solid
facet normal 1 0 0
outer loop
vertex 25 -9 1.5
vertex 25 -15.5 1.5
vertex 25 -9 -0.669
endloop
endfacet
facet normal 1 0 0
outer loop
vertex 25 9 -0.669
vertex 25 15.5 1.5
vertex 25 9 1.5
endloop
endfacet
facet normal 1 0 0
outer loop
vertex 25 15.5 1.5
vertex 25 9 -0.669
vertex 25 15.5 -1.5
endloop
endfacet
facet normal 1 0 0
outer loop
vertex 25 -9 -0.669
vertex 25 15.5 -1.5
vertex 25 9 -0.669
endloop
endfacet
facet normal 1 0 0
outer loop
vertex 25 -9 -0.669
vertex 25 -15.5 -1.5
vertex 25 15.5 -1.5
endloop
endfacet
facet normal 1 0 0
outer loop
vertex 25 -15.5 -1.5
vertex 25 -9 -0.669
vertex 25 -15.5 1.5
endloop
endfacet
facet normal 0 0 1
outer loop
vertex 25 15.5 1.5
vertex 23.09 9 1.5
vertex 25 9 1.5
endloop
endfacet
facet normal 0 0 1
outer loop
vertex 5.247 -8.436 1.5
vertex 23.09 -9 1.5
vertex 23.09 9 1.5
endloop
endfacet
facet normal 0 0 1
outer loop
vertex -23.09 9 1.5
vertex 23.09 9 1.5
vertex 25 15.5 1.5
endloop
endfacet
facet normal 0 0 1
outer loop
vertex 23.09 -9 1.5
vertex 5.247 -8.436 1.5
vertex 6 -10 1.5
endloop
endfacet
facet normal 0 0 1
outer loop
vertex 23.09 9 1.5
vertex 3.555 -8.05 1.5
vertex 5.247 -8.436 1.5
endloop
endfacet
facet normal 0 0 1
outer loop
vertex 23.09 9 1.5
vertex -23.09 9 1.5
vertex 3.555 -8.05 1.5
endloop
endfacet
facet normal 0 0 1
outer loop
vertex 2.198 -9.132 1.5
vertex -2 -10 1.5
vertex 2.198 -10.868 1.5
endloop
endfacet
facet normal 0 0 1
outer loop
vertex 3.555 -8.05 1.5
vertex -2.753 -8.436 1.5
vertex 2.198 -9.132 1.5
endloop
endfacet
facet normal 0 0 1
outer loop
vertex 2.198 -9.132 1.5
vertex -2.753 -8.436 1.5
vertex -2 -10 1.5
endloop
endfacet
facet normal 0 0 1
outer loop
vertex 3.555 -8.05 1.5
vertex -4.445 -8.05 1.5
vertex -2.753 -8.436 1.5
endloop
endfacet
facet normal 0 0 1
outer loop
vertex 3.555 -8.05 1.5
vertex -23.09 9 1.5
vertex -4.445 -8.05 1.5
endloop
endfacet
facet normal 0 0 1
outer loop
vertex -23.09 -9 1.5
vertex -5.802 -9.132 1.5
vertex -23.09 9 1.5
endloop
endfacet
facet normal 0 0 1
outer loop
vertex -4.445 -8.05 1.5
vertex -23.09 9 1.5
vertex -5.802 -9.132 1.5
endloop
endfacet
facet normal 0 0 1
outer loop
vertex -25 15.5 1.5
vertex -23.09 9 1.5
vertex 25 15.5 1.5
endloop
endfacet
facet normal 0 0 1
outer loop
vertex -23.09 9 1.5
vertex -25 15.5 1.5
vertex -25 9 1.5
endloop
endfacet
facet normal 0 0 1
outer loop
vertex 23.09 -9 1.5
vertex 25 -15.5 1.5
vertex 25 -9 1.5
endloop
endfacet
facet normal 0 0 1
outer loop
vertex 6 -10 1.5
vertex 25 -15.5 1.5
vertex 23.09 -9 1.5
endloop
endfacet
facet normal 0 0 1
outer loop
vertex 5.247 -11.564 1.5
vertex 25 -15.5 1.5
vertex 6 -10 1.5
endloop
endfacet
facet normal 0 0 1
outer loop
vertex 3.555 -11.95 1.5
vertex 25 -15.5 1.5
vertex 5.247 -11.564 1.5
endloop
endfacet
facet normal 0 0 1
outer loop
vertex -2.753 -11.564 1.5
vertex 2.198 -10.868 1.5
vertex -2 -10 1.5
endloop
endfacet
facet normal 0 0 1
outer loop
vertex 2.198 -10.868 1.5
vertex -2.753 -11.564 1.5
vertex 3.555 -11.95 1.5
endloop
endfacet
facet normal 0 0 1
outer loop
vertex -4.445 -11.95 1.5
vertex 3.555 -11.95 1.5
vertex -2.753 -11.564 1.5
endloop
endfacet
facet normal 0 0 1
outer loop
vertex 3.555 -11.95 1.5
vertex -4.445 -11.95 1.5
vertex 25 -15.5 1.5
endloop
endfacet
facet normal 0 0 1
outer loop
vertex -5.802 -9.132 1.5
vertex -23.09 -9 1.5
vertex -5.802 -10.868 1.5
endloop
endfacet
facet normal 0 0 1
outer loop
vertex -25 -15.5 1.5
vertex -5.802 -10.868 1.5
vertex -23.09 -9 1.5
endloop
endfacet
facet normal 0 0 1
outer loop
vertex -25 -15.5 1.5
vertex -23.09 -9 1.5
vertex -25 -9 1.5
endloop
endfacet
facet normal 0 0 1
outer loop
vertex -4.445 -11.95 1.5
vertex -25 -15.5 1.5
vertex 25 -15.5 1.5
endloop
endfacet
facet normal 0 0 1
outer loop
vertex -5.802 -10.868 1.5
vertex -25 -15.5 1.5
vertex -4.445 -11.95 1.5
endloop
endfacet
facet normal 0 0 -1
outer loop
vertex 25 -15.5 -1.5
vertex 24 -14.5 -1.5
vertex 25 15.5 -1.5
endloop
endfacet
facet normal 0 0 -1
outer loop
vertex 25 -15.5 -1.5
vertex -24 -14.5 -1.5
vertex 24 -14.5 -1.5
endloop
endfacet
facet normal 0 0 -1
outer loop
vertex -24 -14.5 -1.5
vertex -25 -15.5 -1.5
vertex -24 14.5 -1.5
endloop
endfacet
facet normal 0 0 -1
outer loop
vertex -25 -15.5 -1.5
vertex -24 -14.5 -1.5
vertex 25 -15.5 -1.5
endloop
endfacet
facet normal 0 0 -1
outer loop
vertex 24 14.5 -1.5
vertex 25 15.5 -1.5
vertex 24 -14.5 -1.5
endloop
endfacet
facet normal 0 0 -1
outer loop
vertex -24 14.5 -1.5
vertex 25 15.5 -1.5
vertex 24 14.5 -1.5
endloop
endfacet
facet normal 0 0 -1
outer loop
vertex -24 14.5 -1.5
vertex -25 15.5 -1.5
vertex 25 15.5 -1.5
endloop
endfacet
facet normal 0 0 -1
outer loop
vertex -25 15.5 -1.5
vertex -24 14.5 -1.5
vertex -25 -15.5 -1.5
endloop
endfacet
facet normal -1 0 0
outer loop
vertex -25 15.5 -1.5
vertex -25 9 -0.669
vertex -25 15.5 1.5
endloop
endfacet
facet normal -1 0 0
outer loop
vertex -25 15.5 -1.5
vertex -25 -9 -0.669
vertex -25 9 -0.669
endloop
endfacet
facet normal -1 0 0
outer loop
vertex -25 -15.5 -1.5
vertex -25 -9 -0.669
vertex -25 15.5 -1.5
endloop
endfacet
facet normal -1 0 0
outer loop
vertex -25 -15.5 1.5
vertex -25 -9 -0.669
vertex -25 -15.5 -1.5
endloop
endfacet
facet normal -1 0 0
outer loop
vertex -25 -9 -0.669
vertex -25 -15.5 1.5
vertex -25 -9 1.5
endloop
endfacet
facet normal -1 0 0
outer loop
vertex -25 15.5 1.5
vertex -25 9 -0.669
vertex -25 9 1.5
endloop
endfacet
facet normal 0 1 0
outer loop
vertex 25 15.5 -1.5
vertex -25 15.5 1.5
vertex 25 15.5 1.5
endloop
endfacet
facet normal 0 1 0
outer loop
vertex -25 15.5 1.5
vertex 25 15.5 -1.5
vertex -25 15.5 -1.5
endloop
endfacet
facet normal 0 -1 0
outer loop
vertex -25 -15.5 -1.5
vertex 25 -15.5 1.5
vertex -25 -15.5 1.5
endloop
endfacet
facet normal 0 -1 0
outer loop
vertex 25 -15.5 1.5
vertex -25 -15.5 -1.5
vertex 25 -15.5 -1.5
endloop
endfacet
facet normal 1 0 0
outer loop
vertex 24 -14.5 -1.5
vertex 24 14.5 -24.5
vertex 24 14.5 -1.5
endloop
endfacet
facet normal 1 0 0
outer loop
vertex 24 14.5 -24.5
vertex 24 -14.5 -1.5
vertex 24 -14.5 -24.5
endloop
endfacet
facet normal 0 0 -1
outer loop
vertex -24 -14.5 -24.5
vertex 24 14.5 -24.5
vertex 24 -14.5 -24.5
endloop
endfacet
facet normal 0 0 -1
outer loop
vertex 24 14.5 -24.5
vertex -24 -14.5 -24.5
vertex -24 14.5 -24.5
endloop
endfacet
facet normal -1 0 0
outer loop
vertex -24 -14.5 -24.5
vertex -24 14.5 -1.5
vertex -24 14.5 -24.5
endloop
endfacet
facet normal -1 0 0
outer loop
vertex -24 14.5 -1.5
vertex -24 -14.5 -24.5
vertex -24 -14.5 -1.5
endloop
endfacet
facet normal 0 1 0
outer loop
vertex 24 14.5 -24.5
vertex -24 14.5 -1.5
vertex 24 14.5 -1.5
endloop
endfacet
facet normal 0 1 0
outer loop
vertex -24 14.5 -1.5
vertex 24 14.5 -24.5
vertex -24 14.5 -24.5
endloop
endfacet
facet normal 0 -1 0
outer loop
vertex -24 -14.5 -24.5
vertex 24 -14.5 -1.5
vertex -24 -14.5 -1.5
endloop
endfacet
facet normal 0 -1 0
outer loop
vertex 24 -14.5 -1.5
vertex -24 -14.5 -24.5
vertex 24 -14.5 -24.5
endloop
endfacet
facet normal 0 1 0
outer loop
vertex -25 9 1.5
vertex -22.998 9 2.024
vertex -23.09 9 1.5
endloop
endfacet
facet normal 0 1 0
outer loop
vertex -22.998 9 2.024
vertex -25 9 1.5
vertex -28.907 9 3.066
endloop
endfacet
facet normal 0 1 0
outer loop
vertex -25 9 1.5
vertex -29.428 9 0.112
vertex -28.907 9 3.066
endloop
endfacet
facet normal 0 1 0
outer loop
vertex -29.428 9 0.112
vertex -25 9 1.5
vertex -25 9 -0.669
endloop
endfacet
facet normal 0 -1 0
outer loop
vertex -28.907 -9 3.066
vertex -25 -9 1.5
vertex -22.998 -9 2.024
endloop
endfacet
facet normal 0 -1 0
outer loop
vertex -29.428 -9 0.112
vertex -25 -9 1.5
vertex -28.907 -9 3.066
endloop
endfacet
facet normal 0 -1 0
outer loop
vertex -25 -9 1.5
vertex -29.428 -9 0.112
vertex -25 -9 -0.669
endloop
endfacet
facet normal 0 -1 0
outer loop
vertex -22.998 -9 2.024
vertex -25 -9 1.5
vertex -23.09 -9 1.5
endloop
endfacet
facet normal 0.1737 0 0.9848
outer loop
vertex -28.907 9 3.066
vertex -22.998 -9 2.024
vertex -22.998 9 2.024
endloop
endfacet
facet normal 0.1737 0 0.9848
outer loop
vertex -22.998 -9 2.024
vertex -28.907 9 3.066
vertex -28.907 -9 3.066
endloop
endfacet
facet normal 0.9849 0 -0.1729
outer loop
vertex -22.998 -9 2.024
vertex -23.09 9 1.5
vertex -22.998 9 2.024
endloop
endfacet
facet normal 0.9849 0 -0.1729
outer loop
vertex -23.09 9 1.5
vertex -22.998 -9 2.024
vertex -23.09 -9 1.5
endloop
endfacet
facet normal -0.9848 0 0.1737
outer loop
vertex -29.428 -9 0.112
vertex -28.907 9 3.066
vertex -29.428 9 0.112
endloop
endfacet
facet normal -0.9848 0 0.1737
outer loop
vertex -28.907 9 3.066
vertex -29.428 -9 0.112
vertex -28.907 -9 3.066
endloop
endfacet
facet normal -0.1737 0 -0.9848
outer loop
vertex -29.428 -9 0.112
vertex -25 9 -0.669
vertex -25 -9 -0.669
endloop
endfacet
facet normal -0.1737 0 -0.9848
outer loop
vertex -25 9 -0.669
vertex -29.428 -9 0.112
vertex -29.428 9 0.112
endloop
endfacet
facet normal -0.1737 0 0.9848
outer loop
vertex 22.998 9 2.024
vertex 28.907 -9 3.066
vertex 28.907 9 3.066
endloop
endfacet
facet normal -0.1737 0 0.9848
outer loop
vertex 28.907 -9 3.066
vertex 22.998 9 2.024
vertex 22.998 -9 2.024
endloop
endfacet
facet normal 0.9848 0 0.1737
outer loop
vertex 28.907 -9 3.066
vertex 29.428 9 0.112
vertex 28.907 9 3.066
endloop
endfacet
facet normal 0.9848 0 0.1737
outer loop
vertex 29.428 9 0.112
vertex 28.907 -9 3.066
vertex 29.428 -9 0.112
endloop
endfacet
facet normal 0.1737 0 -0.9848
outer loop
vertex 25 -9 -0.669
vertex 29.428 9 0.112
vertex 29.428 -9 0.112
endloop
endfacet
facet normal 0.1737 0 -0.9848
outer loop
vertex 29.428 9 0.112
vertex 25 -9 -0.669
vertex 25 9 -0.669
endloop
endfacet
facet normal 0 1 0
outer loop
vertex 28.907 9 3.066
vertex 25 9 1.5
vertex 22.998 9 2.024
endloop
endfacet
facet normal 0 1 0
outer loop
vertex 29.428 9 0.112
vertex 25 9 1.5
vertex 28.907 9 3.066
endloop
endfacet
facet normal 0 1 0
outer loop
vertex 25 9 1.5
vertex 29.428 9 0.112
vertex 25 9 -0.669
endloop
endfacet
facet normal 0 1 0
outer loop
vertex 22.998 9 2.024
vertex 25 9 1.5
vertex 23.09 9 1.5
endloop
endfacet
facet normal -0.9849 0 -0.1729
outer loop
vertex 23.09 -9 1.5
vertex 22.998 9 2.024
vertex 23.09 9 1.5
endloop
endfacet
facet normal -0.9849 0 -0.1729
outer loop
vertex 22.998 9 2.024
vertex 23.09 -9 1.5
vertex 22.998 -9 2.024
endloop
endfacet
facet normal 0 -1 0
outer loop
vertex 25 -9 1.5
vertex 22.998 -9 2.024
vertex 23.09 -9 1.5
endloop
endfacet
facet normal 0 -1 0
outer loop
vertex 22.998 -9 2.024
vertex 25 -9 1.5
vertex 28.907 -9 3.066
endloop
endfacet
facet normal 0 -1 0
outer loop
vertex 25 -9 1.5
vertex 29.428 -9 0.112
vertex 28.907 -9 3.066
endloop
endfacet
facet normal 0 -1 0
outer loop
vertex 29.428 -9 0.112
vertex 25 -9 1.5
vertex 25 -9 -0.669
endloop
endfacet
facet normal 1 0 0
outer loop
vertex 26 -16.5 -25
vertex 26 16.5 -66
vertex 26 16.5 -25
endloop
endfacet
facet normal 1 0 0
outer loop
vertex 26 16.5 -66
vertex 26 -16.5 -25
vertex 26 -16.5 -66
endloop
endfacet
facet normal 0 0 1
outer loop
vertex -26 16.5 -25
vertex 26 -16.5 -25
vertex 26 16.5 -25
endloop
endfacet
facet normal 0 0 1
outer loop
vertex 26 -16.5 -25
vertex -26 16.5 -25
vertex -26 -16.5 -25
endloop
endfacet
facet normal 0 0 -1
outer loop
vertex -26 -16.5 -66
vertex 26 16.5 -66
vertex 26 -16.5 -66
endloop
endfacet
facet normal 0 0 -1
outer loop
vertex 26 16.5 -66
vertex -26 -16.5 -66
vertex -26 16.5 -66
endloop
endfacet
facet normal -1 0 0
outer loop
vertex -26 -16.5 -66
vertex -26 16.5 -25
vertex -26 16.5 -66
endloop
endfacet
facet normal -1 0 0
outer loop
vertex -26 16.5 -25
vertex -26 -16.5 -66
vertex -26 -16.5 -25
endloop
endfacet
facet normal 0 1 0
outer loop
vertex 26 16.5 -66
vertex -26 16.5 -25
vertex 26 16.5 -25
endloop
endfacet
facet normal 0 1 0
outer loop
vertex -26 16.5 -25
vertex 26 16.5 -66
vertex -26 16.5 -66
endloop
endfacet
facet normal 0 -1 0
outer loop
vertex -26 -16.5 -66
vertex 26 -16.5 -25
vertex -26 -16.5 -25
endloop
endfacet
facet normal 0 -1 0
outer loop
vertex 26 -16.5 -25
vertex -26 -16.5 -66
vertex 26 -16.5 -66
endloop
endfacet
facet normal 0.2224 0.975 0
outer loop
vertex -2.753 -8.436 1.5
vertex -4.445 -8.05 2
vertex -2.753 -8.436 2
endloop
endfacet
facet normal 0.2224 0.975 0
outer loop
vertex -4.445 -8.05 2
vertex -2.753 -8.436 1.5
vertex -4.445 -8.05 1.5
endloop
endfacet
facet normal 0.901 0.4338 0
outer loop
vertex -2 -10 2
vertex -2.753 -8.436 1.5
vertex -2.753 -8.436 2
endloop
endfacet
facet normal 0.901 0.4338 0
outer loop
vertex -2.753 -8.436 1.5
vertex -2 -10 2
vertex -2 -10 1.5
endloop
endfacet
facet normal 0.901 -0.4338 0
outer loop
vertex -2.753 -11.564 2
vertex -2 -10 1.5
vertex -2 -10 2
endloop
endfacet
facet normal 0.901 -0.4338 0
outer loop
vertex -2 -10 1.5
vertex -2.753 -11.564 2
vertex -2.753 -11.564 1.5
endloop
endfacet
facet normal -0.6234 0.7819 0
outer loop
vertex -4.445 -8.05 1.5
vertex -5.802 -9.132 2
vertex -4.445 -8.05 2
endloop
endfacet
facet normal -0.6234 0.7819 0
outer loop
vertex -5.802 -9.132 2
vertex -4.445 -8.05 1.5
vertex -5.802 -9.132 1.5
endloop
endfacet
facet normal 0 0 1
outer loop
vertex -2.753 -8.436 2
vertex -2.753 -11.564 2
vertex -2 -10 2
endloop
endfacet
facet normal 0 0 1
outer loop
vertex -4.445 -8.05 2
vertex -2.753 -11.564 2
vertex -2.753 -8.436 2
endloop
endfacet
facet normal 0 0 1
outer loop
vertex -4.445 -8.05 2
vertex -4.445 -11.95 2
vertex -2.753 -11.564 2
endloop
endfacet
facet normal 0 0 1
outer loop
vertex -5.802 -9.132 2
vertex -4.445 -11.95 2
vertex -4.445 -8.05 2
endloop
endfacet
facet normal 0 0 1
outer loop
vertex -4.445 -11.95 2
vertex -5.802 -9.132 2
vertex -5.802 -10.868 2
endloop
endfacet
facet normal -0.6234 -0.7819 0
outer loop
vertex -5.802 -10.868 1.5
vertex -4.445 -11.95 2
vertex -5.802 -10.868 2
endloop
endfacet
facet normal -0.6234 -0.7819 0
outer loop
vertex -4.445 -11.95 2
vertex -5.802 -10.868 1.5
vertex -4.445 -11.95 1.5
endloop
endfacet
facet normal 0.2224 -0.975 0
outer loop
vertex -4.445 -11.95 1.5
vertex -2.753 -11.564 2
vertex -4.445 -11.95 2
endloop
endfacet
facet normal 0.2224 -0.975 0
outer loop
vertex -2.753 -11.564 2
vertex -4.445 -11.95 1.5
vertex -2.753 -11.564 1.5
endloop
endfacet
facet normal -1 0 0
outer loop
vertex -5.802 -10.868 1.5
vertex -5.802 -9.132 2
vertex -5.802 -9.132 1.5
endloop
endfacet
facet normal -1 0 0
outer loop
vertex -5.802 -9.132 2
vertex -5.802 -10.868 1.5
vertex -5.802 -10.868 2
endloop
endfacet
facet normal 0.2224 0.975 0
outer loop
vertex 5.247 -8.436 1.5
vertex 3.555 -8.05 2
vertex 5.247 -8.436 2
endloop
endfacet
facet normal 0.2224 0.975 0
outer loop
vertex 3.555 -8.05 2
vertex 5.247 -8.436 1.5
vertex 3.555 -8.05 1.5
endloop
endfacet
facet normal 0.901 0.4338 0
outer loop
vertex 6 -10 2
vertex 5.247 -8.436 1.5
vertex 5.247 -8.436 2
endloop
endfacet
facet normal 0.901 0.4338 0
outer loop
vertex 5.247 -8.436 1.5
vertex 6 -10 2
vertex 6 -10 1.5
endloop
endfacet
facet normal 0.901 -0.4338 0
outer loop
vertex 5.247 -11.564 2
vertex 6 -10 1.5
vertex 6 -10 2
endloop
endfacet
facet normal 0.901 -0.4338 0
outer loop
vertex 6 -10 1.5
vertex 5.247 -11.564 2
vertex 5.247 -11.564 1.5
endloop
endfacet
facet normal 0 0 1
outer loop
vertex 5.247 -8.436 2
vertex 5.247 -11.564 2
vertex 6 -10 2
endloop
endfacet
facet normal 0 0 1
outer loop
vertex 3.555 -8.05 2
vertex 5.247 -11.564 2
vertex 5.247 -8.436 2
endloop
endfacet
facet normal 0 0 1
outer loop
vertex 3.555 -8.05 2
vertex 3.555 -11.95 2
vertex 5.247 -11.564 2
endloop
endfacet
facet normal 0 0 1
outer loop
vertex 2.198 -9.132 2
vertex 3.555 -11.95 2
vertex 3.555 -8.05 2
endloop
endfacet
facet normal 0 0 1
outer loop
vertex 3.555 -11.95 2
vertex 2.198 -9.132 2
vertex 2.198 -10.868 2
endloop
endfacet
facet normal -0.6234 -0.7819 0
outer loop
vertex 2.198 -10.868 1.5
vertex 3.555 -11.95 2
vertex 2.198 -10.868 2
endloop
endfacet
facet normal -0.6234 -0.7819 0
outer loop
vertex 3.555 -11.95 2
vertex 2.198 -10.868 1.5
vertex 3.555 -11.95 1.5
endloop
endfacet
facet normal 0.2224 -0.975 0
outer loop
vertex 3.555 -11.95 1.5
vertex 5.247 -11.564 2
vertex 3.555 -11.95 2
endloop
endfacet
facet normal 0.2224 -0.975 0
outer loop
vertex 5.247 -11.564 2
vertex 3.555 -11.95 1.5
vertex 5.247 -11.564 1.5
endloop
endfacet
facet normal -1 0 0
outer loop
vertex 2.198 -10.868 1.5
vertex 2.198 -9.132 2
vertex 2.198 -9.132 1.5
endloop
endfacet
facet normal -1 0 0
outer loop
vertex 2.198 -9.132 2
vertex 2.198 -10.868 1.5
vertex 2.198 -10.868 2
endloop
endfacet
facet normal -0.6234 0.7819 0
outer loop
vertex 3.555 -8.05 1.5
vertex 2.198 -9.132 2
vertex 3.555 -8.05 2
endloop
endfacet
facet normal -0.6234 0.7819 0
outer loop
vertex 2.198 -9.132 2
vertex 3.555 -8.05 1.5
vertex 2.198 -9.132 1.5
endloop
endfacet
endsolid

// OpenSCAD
// Parameters
tolerance_mm = 0.2; //[0.05:0.6:0.05]
overlap_mm = 1.0; //[0.5:2.0:0.1]
overall_width_mm = 48; //[24:96:1]
overall_height_mm = 29; //[15:58:1]
overall_depth_mm = 24; //[12:48:1]
bezel_width_mm = 50; //[25:100:1]
bezel_height_mm = 31; //[16:62:1]
bezel_thickness_mm = 3; //[1.5:6:0.5]
corner_radius_mm = 2; //[0:6:0.5]
panel_cutout_width_mm = 46; //[23:92:1]
panel_cutout_height_mm = 27; //[14:54:1]
panel_thickness_mm = 3; //[1:6:0.5]
display_window_width_mm = 34; //[17:68:1]
display_window_height_mm = 14; //[7:28:1]
display_window_inset_mm = 0.5; //[0.2:2:0.1]
mounting_tab_width_mm = 6; //[3:12:0.5]
mounting_tab_height_mm = 18; //[9:36:1]
mounting_tab_depth_mm = 3; //[1.5:8:0.5]
mounting_tab_angle_deg = 10; //[0:20:1]
rear_clearance_width_mm = 52; //[26:104:1]
rear_clearance_height_mm = 33; //[17:66:1]
rear_clearance_depth_mm = 35; //[18:70:1]
connector_clearance_mm = 6; //[3:15:1]
pcb_width_mm = 44; //[22:88:1]
pcb_height_mm = 25; //[13:50:1]
pcb_thickness_mm = 1.6; //[0.8:3.2:0.1]
pcb_offset_from_front_mm = 10; //[4:20:1]
button_diameter_mm = 4; //[2:8:0.5]
button_height_mm = 1.5; //[0.8:4:0.1]
button_spacing_mm = 8; //[4:16:0.5]
button_y_offset_mm = -10; //[-20:0:1]

// Panel Meter - complete geometry
module panel_meter() {
  color("Black") {
    // Meter Body
    translate([0, 0, -(bezel_thickness_mm/2 + overall_depth_mm/2 - overlap_mm)])
      cube([overall_width_mm, overall_height_mm, overall_depth_mm], center=true);
    
    // Front Bezel
    difference() {
      translate([0, 0, 0])
        cube([bezel_width_mm, bezel_height_mm, bezel_thickness_mm], center=true);
      translate([0, 0, 0])
        cube([display_window_width_mm, display_window_height_mm, (bezel_thickness_mm + 2*overlap_mm)], center=true);
    }
    
    // Mounting Tabs
    rotate([0, mounting_tab_angle_deg, 0])
      translate([-(overall_width_mm/2 + mounting_tab_width_mm/2 - overlap_mm), 0, -(bezel_thickness_mm + mounting_tab_depth_mm/2 - overlap_mm)])
        cube([mounting_tab_width_mm, mounting_tab_height_mm, mounting_tab_depth_mm], center=true);
    rotate([0, -mounting_tab_angle_deg, 0])
      translate([(overall_width_mm/2 + mounting_tab_width_mm/2 - overlap_mm), 0, -(bezel_thickness_mm + mounting_tab_depth_mm/2 - overlap_mm)])
        cube([mounting_tab_width_mm, mounting_tab_height_mm, mounting_tab_depth_mm], center=true);
    
    // PCB Volume
    translate([0, 0, -(pcb_offset_from_front_mm)])
      cube([pcb_width_mm, pcb_height_mm, pcb_thickness_mm], center=true);
    
    // Rear Clearance Volume
    translate([0, 0, -(bezel_thickness_mm + overall_depth_mm - overlap_mm) - (rear_clearance_depth_mm + connector_clearance_mm)/2 + overlap_mm])
      cube([rear_clearance_width_mm, rear_clearance_height_mm, (rear_clearance_depth_mm + connector_clearance_mm)], center=true);
  }
}

// Panel Meter Cutout - complete geometry
module panel_meter_cutout() {
  color("Silver") {
    translate([0, 0, 0])
      cube([(panel_cutout_width_mm + 2*tolerance_mm), (panel_cutout_height_mm + 2*tolerance_mm), panel_thickness_mm], center=true);
  }
}

// Panel Meter Button - complete geometry
module panel_meter_button() {
  color("White") {
    // Left Button
    translate([-button_spacing_mm/2, button_y_offset_mm, (bezel_thickness_mm/2 + button_height_mm/2 - overlap_mm)])
      cylinder(r=button_diameter_mm/2, h=button_height_mm, center=true);
    
    // Right Button
    translate([button_spacing_mm/2, button_y_offset_mm, (bezel_thickness_mm/2 + button_height_mm/2 - overlap_mm)])
      cylinder(r=button_diameter_mm/2, h=button_height_mm, center=true);
  }
}

// Assembly
module assembly() {
  panel_meter();
  panel_meter_cutout();
  panel_meter_button();
}

assembly();
